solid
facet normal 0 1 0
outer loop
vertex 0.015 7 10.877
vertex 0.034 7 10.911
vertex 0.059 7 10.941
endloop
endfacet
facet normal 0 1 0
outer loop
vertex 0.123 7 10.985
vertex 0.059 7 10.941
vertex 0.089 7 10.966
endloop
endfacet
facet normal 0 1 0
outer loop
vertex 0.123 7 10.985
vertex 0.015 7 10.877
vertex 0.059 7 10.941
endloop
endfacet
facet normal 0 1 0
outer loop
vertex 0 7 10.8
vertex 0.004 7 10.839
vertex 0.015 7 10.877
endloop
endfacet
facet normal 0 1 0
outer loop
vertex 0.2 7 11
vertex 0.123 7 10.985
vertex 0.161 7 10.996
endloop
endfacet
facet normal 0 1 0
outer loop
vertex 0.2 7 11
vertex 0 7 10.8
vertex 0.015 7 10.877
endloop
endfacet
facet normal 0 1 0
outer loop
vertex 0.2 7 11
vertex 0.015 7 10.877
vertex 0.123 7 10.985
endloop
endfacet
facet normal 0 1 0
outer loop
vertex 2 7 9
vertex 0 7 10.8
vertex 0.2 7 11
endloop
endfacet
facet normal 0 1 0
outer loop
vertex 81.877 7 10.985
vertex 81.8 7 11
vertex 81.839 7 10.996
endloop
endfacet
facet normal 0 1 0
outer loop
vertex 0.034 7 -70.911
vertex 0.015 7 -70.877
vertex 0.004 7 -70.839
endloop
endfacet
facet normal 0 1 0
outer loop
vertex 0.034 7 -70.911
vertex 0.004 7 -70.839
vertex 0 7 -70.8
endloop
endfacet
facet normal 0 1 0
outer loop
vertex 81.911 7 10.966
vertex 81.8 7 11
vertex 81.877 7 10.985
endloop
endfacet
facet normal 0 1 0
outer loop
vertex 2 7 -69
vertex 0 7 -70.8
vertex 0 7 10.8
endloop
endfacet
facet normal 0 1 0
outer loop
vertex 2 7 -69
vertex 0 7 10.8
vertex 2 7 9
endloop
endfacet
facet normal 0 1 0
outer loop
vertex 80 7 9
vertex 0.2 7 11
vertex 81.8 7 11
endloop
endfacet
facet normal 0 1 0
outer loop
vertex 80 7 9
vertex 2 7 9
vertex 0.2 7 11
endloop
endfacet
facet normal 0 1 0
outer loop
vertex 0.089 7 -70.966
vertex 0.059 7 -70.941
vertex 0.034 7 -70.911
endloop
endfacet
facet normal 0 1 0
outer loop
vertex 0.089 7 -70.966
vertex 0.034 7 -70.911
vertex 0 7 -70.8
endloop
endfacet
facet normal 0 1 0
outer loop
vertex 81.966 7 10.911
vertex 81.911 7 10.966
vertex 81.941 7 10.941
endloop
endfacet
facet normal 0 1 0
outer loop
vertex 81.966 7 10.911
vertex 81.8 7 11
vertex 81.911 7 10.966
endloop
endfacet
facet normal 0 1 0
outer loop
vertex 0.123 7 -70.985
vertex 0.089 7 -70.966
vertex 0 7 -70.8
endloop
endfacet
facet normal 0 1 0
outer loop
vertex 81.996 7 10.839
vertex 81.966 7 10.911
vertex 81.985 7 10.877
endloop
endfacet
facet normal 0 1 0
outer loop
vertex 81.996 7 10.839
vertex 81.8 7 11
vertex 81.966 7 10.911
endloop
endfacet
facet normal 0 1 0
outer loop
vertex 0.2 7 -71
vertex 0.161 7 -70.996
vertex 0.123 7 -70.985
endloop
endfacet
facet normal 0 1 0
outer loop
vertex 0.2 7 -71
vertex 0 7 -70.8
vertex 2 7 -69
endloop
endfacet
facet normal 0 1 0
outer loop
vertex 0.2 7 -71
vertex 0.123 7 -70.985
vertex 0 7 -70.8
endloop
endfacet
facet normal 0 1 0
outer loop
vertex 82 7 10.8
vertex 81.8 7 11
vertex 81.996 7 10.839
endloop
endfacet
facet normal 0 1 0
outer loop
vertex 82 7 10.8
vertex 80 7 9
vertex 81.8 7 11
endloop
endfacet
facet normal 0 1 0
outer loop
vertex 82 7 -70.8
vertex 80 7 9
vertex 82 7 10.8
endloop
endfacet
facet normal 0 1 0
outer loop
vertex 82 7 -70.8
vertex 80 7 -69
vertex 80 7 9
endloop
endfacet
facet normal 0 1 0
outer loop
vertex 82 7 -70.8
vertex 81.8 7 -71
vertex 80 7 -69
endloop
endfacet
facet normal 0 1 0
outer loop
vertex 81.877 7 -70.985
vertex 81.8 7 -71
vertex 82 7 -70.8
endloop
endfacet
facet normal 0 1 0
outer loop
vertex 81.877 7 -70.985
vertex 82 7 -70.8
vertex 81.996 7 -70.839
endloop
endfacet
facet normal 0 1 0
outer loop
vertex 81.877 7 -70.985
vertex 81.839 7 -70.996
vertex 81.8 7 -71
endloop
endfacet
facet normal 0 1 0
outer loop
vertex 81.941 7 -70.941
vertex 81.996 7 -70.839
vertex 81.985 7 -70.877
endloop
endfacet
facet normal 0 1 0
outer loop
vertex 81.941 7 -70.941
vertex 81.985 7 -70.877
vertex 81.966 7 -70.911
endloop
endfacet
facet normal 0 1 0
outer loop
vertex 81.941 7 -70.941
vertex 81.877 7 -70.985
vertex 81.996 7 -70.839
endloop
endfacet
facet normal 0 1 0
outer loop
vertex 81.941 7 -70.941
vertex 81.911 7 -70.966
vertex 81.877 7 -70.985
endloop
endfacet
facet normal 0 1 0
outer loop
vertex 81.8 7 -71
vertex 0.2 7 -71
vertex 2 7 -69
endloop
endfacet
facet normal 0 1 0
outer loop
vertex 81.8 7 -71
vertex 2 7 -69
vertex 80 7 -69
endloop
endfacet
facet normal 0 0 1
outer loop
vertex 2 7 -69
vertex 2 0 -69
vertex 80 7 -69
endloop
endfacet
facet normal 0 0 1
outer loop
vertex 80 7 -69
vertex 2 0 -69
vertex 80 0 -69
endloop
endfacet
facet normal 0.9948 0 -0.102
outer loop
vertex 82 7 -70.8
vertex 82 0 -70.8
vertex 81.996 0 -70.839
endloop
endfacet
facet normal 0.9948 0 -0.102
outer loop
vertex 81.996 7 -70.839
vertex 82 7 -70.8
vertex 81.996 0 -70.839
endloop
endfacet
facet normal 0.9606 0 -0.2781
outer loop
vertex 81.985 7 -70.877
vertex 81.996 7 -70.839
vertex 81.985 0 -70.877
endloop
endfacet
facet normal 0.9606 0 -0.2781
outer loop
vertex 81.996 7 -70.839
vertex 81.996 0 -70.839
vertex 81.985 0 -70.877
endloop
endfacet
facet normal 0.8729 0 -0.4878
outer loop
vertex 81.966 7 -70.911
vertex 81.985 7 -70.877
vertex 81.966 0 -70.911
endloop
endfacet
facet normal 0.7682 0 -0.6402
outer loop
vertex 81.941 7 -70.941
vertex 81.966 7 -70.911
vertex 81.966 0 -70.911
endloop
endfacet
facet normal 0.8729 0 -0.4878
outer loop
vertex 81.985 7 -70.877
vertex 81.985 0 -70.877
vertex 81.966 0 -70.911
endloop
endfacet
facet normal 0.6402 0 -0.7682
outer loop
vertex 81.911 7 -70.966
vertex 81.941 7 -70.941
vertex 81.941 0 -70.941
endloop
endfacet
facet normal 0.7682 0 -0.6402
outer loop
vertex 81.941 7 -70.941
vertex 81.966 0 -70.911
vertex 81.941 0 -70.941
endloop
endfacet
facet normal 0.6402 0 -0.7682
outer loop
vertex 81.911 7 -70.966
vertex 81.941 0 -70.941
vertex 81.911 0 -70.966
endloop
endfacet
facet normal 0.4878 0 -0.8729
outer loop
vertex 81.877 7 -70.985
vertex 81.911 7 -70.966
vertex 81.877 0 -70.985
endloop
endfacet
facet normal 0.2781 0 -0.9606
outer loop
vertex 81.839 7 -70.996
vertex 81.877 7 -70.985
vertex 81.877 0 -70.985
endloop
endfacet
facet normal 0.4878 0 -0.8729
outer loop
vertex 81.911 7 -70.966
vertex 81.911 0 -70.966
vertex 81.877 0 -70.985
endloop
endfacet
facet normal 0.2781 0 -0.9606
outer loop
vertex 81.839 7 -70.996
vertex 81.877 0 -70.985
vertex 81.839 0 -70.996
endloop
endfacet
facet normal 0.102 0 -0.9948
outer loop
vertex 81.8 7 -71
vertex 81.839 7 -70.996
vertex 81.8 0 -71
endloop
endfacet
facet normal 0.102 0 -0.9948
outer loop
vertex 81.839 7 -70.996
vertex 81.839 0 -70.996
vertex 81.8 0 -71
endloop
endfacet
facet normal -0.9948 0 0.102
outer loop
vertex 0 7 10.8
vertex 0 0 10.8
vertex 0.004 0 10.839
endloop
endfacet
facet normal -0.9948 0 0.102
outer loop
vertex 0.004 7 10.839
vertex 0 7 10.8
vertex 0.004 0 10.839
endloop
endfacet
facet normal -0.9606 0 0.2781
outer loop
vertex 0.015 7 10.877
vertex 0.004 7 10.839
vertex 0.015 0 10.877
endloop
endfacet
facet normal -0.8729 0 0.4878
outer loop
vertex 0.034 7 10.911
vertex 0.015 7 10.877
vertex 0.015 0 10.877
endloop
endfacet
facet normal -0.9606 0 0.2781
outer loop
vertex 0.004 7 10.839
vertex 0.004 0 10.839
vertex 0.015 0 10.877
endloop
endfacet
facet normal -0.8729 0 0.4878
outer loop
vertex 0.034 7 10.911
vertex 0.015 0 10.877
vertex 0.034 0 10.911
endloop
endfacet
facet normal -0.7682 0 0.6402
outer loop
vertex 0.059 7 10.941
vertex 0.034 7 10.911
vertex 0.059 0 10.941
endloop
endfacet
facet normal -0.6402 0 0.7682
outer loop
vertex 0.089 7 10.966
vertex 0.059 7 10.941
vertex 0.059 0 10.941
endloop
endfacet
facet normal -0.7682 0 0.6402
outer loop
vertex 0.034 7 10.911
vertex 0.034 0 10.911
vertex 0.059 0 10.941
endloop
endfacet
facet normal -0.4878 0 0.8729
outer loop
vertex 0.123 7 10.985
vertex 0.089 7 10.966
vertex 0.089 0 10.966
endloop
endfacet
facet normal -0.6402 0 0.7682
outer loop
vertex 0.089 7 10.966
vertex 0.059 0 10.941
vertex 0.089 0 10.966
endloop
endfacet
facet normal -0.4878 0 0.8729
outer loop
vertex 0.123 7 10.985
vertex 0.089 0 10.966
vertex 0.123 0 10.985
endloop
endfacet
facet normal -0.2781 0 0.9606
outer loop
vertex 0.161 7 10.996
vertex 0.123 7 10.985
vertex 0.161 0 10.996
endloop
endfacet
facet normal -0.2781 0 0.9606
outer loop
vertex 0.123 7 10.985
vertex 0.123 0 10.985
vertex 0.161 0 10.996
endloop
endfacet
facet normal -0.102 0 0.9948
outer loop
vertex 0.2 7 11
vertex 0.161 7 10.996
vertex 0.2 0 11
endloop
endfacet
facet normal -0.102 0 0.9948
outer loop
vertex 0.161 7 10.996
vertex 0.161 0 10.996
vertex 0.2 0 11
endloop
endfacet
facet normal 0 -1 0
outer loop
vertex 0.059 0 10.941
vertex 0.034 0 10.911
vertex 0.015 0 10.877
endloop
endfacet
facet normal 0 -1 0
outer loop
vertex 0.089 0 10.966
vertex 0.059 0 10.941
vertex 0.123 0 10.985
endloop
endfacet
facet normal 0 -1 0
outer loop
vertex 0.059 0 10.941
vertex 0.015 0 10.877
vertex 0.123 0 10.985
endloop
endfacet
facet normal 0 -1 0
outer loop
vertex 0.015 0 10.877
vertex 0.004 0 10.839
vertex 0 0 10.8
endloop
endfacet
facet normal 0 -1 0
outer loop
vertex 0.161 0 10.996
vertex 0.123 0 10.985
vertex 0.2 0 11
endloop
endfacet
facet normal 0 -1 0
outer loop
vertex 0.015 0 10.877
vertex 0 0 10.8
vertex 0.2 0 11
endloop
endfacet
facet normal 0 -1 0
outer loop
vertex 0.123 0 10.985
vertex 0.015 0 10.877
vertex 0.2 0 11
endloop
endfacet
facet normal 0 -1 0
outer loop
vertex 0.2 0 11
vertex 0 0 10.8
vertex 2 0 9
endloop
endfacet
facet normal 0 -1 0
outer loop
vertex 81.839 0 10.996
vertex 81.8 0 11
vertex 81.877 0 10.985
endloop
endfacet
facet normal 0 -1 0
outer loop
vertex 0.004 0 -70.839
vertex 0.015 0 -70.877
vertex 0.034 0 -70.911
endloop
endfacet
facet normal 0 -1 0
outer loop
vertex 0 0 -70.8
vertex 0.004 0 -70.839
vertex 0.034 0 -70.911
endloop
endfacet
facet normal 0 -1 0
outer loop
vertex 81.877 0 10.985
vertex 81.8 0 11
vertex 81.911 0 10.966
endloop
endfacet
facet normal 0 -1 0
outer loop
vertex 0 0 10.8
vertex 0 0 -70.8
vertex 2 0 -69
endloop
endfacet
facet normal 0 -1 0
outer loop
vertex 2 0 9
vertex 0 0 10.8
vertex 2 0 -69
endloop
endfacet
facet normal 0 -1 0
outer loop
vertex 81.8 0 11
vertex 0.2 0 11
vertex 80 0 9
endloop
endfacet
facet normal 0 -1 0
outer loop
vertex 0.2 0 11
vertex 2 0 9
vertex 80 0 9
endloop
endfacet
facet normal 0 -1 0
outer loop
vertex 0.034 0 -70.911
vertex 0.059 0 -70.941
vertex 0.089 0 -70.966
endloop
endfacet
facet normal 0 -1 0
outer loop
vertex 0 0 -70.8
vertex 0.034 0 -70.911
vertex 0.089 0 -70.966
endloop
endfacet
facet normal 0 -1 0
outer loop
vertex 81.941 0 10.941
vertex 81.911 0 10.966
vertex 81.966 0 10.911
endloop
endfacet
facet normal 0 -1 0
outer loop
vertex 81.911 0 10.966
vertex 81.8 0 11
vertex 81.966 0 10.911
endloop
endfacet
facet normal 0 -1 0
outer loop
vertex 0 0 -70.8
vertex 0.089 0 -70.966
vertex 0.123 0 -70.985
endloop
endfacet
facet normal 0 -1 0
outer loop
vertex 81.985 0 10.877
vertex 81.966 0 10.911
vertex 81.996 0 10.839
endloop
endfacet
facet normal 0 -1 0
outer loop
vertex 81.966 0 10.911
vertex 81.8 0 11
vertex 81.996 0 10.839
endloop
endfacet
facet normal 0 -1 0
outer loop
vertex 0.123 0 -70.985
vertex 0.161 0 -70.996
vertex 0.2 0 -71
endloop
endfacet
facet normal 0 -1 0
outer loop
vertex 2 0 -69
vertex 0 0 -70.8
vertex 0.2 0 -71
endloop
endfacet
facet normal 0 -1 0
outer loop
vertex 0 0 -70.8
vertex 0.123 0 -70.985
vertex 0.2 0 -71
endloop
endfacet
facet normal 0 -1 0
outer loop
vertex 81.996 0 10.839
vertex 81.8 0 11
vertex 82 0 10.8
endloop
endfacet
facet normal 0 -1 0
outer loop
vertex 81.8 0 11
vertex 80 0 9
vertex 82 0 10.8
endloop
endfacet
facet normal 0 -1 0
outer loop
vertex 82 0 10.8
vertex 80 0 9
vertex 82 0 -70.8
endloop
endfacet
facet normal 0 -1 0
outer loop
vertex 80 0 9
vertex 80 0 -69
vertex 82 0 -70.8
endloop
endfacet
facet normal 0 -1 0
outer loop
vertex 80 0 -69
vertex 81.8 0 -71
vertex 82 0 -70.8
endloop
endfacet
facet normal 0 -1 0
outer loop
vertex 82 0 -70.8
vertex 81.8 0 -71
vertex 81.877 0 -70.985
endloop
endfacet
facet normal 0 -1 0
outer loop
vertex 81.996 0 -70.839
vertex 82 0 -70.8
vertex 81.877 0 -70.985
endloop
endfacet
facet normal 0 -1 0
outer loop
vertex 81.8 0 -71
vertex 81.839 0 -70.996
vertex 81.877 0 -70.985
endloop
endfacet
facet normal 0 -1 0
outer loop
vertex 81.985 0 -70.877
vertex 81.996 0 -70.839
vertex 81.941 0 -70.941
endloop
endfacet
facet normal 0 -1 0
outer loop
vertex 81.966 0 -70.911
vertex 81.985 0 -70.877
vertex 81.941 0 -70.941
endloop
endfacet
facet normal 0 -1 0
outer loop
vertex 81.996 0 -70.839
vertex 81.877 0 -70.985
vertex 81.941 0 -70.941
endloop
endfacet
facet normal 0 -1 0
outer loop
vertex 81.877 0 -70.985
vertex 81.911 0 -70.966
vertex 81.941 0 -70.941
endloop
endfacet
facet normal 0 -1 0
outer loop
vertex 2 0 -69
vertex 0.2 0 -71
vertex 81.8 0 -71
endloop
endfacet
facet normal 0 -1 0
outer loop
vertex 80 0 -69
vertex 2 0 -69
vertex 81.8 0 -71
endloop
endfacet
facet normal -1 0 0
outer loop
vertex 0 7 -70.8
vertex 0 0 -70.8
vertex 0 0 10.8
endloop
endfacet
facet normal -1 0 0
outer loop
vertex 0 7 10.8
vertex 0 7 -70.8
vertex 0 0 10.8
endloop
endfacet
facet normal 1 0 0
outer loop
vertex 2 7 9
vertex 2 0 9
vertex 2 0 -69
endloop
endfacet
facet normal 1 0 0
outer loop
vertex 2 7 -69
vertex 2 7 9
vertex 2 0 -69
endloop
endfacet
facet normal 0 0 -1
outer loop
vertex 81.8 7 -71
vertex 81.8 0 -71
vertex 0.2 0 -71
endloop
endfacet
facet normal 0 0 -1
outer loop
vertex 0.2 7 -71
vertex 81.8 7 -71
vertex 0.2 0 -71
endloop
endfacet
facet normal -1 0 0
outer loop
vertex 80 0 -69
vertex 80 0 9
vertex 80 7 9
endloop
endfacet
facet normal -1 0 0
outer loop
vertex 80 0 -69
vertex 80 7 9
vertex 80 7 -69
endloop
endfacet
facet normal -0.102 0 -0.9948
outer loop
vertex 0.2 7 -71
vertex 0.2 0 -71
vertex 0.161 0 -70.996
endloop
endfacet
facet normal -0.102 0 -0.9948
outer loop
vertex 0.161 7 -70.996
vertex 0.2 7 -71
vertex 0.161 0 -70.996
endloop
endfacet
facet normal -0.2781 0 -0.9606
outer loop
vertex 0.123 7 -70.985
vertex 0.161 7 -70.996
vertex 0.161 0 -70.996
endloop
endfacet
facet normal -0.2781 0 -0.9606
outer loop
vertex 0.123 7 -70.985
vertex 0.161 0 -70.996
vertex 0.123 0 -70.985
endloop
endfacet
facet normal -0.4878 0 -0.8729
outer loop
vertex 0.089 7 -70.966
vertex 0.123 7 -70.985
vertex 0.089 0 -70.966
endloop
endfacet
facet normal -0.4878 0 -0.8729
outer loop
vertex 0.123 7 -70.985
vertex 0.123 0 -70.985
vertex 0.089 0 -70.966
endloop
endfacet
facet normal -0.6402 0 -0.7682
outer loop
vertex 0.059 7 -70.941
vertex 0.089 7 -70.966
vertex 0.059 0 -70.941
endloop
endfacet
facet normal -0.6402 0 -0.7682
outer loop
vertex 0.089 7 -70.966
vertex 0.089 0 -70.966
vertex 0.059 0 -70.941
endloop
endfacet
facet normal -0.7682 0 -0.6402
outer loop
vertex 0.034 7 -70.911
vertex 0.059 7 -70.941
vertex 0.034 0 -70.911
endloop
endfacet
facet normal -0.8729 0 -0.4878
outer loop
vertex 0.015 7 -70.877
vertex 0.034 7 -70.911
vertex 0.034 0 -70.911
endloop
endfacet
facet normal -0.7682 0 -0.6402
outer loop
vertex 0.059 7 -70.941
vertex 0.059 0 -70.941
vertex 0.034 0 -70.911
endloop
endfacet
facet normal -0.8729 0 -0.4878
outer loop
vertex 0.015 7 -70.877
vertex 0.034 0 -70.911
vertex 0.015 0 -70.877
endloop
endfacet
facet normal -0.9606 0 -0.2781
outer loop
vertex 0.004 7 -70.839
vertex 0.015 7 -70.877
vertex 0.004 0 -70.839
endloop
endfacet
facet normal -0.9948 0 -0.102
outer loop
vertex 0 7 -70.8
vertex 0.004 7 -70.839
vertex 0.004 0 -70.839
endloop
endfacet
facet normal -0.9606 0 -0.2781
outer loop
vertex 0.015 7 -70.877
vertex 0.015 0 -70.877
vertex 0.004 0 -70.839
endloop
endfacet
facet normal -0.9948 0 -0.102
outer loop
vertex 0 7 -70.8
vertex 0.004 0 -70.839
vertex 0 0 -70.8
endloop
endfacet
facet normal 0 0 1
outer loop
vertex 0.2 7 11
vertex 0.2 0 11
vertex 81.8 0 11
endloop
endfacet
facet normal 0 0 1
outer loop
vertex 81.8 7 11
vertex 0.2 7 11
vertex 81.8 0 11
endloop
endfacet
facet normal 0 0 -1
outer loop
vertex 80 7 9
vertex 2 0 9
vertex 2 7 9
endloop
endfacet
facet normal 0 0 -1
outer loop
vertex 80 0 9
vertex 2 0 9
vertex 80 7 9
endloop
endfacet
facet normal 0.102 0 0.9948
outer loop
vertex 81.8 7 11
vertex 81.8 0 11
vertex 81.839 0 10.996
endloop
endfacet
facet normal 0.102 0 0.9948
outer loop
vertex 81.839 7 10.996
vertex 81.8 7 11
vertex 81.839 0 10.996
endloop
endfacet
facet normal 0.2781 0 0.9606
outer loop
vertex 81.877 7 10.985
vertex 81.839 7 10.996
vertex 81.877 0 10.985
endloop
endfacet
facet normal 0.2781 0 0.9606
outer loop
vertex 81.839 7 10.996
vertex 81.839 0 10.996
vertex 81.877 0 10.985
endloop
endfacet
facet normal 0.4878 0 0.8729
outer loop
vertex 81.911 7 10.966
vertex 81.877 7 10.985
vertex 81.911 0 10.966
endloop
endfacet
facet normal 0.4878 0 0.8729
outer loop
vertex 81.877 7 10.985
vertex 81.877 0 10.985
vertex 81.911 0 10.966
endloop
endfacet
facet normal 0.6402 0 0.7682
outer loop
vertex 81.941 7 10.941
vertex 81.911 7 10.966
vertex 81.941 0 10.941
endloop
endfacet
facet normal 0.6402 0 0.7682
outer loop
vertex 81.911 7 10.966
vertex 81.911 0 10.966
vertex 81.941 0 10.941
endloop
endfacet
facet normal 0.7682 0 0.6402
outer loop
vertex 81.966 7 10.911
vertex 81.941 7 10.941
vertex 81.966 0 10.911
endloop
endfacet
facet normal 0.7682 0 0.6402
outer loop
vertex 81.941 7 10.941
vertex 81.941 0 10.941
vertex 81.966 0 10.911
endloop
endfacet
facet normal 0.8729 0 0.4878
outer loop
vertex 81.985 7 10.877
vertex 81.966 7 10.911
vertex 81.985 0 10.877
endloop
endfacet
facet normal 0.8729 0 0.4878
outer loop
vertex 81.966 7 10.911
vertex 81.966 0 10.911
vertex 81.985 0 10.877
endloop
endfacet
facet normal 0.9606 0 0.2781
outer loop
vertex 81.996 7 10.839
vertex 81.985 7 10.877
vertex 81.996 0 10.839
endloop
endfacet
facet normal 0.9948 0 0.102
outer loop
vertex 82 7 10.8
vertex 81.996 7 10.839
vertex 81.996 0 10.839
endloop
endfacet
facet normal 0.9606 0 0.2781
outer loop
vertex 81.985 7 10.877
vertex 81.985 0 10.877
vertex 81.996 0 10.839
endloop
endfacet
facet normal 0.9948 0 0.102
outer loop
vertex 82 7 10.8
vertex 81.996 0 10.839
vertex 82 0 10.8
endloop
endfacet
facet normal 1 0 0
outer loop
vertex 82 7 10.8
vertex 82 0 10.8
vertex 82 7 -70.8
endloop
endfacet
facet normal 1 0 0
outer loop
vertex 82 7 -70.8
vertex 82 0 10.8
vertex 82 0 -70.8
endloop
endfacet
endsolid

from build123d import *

# Parameters (mm, degrees)
SKETCH1_W  = 78
SKETCH1_H  = 78
COIL_DEPTH = 7


with BuildPart() as part:
    # Sketch1 → Coil (new body)
    with BuildSketch(Plane(origin=(0, 0, 0), x_dir=(1, 0, 0), z_dir=(0, 1, 0))):
        with BuildLine():
            Line((0.2, -11), (81.8, -11))
            ThreePointArc((81.8, -11), (81.941421356, -10.941421356), (82, -10.8))
            Line((82, -10.8), (82, 70.8))
            ThreePointArc((82, 70.8), (81.941421356, 70.941421356), (81.8, 71))
            Line((81.8, 71), (0.2, 71))
            ThreePointArc((0.2, 71), (0.058578644, 70.941421356), (0, 70.8))
            Line((0, 70.8), (0, -10.8))
            ThreePointArc((0, -10.8), (0.058578644, -10.941421356), (0.2, -11))
        make_face()
        with Locations((41, 30)):
            Rectangle(SKETCH1_W, SKETCH1_H, mode=Mode.SUBTRACT)
    extrude(amount=COIL_DEPTH)


solid = part.part
